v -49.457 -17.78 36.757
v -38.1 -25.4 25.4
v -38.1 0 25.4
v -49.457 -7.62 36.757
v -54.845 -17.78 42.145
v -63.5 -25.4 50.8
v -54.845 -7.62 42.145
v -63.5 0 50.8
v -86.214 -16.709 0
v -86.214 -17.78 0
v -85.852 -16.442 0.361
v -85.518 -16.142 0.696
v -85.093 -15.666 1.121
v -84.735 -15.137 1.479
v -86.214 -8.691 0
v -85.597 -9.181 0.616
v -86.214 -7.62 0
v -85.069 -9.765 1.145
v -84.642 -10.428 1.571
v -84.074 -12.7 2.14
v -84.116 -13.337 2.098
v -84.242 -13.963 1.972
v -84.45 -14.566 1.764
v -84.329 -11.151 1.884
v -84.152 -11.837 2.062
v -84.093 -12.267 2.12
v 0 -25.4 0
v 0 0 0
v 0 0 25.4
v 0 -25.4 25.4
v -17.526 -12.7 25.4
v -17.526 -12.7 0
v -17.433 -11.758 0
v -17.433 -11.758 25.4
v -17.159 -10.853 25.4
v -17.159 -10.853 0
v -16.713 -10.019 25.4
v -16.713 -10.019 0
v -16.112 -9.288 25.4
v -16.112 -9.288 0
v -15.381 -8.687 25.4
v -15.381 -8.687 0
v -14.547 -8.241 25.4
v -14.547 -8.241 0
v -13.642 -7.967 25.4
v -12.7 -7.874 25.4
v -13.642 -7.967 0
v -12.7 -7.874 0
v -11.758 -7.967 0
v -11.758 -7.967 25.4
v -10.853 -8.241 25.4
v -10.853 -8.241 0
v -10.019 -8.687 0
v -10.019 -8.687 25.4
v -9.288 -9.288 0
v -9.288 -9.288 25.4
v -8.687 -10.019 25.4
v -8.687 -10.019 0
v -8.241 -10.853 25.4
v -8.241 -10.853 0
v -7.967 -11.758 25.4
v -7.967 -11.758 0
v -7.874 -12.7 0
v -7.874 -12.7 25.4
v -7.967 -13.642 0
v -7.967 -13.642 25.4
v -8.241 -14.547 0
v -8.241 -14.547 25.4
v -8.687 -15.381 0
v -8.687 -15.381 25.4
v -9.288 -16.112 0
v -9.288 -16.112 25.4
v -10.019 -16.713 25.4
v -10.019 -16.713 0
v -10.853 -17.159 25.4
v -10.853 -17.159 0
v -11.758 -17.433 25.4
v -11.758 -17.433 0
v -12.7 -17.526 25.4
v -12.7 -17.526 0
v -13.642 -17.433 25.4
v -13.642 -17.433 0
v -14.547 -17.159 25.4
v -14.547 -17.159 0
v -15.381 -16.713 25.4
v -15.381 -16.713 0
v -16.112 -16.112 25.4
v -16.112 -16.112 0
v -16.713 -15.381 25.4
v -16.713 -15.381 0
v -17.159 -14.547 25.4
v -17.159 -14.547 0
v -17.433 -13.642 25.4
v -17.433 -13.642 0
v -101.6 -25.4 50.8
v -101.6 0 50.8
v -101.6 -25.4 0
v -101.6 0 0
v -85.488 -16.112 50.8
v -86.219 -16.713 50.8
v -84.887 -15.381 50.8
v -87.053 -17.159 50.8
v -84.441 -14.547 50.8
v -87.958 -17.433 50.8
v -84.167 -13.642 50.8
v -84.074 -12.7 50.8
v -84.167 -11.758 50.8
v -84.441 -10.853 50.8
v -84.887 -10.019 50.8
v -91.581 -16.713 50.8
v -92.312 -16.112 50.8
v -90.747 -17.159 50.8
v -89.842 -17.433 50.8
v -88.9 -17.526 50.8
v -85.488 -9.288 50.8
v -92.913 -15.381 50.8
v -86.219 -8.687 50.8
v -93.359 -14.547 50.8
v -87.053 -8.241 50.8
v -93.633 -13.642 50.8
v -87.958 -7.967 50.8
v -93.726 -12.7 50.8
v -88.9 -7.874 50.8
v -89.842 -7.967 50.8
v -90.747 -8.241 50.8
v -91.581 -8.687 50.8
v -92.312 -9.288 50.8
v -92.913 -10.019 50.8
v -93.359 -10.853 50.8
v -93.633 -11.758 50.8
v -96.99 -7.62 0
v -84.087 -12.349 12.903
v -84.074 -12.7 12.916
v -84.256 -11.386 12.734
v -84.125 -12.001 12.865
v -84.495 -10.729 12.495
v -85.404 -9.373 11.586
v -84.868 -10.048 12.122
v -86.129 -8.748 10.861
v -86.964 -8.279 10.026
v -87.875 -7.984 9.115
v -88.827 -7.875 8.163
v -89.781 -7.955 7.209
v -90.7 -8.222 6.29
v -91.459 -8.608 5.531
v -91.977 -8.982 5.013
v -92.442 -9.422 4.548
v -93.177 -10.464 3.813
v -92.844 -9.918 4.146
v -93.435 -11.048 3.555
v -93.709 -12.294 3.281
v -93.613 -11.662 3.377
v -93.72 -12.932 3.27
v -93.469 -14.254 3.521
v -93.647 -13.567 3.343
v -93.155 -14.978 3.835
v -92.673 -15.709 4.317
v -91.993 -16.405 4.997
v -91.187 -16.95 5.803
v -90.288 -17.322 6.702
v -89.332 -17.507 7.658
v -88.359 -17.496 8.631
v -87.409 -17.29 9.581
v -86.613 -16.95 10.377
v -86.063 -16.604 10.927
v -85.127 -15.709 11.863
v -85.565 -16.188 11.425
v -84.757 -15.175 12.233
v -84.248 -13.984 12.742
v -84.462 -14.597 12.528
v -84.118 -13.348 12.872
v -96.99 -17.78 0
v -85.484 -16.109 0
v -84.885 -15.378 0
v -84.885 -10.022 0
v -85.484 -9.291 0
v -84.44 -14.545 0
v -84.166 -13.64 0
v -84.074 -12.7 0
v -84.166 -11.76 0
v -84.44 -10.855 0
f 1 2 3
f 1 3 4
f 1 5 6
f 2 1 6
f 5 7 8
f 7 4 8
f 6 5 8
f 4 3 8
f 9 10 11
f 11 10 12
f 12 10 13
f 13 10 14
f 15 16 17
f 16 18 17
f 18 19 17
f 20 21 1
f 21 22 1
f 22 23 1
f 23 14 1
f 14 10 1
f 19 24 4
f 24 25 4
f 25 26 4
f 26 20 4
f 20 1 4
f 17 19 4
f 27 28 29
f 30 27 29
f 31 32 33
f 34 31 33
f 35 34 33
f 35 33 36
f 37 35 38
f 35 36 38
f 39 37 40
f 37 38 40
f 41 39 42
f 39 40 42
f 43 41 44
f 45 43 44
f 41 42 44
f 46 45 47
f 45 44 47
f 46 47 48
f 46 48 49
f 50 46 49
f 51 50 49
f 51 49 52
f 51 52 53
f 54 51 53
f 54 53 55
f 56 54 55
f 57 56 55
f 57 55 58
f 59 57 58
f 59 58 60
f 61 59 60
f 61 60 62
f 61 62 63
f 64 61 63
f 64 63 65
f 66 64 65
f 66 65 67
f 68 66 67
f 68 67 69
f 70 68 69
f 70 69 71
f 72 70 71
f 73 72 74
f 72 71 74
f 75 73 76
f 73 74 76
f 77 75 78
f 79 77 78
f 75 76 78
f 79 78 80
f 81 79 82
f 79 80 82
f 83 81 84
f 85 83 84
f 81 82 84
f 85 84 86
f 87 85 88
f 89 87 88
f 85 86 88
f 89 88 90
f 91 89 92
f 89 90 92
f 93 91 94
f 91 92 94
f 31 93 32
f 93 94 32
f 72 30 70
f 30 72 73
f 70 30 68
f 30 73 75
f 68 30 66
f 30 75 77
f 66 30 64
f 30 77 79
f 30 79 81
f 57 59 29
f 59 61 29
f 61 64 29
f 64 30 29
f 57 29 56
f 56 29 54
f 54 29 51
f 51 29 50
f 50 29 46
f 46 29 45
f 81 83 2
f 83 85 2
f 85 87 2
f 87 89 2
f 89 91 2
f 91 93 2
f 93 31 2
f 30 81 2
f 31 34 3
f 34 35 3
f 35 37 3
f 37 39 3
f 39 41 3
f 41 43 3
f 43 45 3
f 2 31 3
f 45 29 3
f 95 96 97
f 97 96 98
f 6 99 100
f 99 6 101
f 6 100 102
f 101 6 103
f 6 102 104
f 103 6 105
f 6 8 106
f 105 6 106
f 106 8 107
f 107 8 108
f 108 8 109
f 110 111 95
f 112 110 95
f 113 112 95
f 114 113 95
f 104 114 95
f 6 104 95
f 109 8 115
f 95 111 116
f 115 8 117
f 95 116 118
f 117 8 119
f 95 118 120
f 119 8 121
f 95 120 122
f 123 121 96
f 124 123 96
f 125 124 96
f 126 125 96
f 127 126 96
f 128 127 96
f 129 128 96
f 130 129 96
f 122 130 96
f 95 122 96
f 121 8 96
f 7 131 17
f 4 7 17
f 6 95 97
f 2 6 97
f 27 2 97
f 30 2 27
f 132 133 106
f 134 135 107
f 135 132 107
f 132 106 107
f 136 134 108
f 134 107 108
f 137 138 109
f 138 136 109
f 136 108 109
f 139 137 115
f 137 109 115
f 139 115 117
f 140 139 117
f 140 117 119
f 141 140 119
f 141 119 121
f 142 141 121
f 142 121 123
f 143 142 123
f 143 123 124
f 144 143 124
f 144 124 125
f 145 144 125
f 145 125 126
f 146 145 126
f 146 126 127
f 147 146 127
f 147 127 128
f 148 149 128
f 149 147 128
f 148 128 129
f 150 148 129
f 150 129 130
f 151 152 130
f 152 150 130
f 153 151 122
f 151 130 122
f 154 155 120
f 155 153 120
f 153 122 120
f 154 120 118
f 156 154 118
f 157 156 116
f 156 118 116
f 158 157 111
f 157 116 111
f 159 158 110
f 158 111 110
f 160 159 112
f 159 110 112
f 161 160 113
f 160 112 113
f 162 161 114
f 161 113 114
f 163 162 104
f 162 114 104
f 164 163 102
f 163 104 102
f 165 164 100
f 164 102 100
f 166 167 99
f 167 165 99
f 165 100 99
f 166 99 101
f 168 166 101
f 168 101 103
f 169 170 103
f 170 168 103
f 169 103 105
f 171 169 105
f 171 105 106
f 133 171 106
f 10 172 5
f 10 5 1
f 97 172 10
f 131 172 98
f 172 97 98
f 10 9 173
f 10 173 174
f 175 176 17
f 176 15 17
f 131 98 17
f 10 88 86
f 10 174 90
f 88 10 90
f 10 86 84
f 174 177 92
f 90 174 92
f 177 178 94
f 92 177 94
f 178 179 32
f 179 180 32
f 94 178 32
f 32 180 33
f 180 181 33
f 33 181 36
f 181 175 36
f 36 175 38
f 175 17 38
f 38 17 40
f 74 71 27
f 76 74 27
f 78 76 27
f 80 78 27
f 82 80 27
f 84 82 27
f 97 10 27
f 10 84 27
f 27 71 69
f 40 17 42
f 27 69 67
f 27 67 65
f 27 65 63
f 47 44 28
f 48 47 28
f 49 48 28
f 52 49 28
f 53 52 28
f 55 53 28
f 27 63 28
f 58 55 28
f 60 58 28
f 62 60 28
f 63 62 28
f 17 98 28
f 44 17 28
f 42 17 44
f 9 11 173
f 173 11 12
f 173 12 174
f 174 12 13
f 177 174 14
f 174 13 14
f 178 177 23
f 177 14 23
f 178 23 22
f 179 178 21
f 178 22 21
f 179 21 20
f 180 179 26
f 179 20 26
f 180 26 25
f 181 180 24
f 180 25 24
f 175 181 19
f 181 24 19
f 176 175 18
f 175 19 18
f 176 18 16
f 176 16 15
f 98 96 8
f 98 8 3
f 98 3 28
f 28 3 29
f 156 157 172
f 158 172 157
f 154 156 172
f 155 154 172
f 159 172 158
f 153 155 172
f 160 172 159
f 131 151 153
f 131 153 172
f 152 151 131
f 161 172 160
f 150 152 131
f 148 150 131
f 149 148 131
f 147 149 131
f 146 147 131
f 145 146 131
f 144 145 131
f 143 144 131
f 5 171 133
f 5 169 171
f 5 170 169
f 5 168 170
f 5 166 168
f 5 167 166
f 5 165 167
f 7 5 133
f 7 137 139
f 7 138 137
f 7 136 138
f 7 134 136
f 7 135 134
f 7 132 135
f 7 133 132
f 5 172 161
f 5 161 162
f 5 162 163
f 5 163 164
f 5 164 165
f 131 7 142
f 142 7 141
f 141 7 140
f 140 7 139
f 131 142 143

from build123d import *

# Parameters (mm, degrees)
F1_DEPTH = 25.4
F2_R     = 4.826
F3_DEPTH = 50.801
F5_D     = 9.652
F6_W     = 7.62
F6_H     = 10.16
F7_DEPTH = 62.862793


with BuildPart() as f1:
    # F0 (on Front) → F1 (new body)
    with BuildSketch(Plane.XZ):
        Polygon((-63.5, 50.8), (-101.6, 50.8), (-101.6, 0), (0, 0), (0, 25.4), (-38.1, 25.4), align=None)
    extrude(amount=F1_DEPTH)

    # F2 (on face) → F3 (cut, through all)
    with BuildSketch(Plane.XY.offset(50.8)):
        with Locations((-88.9, -12.7)):
            Circle(F2_R)
    extrude(amount=-F3_DEPTH, mode=Mode.SUBTRACT)

    # F5 (through all)
    with Locations(Plane.XY.offset(25.4)):
        with Locations((-12.7, -12.7)):
            Hole(F5_D / 2)

    # F6 (on face) → F7 (cut, through all)
    with BuildSketch(Plane(origin=(-6.35, 0, -6.35), x_dir=(0.707107, 0, -0.707107), z_dir=(0.707107, 0, 0.707107))):
        with Locations((-64.772308, -12.7)):
            Rectangle(F6_W, F6_H)
    extrude(amount=-F7_DEPTH, mode=Mode.SUBTRACT)


solid = f1.part
